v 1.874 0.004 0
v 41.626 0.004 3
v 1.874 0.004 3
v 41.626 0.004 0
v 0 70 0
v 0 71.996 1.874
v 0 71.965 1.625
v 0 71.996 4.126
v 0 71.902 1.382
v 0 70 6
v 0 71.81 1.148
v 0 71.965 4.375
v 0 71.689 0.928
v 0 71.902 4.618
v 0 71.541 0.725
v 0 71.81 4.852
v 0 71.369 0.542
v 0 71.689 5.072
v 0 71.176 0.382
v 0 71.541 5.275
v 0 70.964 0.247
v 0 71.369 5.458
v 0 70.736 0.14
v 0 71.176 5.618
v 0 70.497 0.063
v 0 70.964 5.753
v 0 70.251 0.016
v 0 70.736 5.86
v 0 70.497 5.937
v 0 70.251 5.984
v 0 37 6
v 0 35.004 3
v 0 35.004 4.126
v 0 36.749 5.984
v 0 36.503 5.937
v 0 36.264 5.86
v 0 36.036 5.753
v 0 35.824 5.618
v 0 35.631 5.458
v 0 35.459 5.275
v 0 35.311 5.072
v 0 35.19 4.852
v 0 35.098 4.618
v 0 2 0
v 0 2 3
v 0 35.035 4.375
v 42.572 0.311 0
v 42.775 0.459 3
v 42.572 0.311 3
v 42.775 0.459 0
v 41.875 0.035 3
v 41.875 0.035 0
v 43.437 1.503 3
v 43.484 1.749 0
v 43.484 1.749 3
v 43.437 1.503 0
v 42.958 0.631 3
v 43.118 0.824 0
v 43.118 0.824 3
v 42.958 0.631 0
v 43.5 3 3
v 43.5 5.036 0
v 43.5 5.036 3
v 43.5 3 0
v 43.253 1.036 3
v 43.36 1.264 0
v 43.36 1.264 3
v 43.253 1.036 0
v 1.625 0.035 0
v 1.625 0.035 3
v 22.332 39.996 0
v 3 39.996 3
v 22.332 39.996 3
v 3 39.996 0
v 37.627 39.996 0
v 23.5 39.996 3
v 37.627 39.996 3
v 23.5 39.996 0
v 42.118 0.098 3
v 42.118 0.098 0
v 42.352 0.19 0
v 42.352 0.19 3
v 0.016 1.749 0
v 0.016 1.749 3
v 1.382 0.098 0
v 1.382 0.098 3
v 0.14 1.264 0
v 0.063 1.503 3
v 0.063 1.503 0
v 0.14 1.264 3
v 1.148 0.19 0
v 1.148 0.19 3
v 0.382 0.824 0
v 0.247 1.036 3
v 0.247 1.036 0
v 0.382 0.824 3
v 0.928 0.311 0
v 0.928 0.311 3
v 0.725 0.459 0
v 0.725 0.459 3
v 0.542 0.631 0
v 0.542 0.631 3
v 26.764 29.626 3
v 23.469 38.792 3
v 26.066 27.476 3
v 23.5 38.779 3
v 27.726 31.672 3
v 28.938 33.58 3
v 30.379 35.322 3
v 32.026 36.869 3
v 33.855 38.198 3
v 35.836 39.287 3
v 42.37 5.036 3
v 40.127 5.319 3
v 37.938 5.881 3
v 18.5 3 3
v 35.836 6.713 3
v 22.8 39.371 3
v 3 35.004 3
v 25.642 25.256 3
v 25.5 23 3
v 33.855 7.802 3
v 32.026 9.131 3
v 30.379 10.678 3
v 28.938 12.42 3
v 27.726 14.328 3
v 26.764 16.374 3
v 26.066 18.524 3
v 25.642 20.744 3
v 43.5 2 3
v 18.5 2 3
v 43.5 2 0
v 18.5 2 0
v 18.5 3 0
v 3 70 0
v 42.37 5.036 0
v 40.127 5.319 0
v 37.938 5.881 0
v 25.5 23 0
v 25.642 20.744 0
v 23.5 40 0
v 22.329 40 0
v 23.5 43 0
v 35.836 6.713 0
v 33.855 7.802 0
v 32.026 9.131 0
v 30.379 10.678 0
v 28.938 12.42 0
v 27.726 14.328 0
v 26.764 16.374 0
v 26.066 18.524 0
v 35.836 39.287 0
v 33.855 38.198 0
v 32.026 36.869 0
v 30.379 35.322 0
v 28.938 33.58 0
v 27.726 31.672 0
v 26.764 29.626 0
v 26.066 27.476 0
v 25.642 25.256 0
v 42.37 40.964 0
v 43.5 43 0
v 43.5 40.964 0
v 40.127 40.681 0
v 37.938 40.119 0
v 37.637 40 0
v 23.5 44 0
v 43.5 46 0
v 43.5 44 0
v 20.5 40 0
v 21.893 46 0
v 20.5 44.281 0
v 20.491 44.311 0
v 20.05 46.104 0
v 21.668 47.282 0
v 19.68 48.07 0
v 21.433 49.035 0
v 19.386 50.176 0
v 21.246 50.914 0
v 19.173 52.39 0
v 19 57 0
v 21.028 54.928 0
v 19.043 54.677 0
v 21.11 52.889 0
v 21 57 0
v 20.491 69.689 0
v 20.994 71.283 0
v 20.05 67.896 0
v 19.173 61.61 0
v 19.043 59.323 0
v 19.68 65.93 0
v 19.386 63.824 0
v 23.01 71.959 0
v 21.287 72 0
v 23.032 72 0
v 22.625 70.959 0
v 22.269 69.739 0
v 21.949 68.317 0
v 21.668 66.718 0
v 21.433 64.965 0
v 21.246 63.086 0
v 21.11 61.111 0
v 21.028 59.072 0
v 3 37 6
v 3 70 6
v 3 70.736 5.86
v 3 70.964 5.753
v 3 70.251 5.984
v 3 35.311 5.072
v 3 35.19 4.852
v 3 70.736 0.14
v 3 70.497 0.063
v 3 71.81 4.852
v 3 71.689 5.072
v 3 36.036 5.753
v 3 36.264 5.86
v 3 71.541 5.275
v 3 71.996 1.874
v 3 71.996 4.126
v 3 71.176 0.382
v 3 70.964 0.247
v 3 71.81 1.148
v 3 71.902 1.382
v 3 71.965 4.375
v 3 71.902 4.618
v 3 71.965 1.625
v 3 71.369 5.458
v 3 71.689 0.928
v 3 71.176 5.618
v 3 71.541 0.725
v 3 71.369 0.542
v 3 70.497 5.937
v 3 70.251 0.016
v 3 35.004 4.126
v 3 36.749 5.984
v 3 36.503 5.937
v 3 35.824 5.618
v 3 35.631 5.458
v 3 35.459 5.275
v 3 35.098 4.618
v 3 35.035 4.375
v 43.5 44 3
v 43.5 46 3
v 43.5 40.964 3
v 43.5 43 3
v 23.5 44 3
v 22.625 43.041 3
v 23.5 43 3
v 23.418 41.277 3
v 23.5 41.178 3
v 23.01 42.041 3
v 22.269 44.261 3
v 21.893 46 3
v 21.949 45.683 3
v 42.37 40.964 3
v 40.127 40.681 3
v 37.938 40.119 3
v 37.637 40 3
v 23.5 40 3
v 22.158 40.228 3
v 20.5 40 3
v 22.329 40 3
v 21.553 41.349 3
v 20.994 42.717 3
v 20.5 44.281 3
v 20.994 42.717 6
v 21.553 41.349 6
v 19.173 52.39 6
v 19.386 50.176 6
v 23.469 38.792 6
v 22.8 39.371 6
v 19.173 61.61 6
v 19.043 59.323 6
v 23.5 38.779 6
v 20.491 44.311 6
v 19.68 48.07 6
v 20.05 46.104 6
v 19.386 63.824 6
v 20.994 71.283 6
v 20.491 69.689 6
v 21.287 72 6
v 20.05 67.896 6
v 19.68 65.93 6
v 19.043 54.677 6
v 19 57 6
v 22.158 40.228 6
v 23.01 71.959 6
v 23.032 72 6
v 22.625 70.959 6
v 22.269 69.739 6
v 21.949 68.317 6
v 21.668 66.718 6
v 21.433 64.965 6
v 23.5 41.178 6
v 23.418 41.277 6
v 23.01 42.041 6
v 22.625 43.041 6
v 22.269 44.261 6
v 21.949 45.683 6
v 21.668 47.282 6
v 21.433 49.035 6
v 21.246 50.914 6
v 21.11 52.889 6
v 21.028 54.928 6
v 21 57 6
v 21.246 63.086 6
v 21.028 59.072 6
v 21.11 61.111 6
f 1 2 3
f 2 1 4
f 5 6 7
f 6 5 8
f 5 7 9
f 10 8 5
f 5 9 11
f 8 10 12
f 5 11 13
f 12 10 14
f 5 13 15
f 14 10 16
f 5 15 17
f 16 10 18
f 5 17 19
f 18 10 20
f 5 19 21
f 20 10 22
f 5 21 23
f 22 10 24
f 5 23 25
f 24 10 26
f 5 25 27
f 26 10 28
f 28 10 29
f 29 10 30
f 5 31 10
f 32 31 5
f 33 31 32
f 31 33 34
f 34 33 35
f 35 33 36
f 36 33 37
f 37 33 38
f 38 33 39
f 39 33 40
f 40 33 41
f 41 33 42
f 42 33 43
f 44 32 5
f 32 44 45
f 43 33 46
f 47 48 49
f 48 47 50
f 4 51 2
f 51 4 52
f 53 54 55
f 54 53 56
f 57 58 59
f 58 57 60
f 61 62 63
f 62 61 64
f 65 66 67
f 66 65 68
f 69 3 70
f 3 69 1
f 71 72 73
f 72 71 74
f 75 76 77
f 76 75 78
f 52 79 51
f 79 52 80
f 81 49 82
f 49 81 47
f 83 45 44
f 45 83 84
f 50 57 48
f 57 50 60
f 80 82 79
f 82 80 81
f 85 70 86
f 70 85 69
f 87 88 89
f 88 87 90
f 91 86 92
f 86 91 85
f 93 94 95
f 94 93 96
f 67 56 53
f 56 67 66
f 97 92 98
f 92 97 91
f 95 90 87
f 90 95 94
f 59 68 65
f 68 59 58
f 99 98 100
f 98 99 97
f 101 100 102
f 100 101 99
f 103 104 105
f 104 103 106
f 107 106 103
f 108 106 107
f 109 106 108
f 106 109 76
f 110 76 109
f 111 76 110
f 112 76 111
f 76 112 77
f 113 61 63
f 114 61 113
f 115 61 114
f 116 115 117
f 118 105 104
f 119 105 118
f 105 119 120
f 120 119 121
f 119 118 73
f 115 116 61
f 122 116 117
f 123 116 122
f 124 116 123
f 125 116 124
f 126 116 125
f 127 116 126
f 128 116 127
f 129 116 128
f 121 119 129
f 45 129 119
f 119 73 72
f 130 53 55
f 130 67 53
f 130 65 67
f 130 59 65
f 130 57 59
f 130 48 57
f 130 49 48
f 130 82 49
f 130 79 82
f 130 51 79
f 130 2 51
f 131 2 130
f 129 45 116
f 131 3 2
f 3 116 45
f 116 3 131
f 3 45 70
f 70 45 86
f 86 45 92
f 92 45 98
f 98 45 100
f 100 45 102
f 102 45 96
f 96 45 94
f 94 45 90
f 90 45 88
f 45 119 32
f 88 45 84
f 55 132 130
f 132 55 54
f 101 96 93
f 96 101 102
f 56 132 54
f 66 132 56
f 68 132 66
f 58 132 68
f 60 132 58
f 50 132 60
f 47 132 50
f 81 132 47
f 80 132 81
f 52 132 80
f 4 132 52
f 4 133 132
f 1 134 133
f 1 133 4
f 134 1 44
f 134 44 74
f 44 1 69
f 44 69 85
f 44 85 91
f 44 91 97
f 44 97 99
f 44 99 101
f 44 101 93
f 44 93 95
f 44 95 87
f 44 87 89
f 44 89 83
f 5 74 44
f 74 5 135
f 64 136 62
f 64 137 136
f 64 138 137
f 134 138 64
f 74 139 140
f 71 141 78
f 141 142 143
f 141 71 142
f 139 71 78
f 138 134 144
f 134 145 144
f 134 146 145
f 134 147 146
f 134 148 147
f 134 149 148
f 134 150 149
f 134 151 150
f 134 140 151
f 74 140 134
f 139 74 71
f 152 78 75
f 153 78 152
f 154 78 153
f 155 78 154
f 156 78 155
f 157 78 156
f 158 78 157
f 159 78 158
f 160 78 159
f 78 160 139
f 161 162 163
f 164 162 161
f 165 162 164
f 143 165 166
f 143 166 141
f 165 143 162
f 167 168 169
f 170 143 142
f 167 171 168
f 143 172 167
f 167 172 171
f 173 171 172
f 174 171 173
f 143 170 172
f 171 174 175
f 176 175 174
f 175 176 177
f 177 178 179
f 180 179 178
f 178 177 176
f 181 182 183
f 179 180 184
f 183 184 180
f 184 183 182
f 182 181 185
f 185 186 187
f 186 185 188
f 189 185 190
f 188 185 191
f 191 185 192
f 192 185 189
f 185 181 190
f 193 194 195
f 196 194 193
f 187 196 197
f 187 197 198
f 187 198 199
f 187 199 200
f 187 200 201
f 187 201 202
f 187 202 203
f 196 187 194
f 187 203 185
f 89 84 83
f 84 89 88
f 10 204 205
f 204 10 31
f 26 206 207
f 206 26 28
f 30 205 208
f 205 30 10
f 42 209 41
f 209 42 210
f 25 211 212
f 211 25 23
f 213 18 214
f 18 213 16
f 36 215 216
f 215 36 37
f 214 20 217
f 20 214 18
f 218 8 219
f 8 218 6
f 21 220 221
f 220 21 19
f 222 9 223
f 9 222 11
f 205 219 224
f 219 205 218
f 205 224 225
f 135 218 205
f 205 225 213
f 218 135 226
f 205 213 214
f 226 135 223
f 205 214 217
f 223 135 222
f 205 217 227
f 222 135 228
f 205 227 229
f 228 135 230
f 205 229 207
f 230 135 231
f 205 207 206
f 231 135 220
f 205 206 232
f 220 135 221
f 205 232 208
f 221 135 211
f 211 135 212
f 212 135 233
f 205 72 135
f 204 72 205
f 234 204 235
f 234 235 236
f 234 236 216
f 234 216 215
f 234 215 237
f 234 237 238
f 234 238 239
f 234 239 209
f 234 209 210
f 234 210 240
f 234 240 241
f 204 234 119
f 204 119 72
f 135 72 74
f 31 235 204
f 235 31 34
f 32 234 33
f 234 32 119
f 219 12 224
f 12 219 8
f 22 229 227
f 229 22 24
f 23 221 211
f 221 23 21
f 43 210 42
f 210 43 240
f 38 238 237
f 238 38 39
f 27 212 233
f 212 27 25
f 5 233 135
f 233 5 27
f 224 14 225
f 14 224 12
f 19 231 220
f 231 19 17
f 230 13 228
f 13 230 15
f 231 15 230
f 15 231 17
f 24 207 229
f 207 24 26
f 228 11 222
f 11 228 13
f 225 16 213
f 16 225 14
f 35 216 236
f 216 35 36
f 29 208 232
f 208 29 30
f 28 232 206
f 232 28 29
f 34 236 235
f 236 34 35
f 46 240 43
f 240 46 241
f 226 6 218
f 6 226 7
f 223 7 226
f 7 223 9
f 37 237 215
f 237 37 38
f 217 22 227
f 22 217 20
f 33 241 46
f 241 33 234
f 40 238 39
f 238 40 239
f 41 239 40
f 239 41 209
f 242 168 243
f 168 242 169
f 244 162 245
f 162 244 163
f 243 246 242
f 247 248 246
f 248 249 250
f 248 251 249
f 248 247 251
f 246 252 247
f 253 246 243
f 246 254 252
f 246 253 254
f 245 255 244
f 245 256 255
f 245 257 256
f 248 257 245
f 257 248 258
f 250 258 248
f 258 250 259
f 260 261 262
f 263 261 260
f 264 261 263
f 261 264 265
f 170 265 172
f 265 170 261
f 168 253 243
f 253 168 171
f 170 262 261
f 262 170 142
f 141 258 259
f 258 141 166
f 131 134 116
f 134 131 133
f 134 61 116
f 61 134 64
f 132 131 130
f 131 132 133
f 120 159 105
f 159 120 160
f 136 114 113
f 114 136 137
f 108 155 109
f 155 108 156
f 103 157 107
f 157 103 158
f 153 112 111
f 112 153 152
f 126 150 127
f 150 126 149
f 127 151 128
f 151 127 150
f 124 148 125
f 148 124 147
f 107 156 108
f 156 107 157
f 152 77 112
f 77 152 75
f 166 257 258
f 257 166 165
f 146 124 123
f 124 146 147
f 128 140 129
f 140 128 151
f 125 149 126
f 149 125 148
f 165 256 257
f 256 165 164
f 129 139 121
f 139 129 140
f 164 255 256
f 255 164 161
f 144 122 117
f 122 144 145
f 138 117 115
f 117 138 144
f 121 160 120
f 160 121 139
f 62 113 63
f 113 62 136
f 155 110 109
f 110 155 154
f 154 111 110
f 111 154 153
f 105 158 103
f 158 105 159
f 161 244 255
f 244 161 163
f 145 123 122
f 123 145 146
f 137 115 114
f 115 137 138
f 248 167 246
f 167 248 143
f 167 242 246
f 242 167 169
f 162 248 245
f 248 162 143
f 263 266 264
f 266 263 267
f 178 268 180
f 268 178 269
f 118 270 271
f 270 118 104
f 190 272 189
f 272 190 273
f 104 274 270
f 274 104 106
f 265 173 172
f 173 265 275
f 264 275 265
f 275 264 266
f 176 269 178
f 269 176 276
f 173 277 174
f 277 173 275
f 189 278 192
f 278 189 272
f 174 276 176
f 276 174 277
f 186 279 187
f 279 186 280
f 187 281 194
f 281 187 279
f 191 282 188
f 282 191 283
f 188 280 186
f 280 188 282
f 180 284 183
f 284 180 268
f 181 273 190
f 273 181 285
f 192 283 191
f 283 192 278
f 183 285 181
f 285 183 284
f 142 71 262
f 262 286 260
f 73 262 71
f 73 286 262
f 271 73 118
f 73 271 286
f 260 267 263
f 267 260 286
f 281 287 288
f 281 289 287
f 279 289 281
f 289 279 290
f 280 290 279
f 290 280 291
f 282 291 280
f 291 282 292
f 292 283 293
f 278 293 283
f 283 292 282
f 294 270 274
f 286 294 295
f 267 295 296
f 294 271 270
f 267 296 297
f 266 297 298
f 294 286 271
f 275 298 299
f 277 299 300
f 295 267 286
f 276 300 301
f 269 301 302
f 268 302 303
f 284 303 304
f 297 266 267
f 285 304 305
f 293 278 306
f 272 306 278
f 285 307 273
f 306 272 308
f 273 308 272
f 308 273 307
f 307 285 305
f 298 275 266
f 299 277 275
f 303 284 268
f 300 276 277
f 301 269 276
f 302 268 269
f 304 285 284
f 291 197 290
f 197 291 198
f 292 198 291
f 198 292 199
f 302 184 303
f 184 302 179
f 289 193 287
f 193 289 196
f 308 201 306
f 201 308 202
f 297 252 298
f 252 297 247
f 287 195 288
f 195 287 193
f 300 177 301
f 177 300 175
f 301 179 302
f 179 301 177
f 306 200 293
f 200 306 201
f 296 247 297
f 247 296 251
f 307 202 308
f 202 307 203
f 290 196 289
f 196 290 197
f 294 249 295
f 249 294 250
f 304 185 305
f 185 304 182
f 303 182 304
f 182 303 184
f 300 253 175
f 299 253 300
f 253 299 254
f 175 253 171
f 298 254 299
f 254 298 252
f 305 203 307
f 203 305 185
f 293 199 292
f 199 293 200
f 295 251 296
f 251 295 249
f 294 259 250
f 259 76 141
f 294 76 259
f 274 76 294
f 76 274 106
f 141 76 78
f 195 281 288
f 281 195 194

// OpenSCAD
//table thickness in mm
table=17.5;

/* [Hidden] */
t=table+1;
$fn=50;

difference() {
	union (){
	translate ([2,2,0]) minkowski(){
		cube([t+21,36,2]);
		cylinder(r=2,h=1);
	}
	translate([0,37,2]) minkowski(){
		cube([2,33,2]);
		rotate([0,90,0]) cylinder(r=2,h=1);
	}
		
	translate([t+2,40,0]) cube([23,6,3]);
	}
	translate([t,2,-1])cube([31,1,5]);
	translate([t+25,23,-1])cylinder(r=18,h=5);
	translate([t+5,43,-1])cube([30,1,5]);
}

difference() {
	translate([t+6,57,0]) resize([11,37,6])cylinder(r=10,h=6);
	translate ([t+6,57,-1])resize([7,33,8]) cylinder(r=10,h=6);
	translate ([t+5,35,-1])cube([20,45,8]);
	translate ([t-1,72,-1])cube([20,45,8]);
}
